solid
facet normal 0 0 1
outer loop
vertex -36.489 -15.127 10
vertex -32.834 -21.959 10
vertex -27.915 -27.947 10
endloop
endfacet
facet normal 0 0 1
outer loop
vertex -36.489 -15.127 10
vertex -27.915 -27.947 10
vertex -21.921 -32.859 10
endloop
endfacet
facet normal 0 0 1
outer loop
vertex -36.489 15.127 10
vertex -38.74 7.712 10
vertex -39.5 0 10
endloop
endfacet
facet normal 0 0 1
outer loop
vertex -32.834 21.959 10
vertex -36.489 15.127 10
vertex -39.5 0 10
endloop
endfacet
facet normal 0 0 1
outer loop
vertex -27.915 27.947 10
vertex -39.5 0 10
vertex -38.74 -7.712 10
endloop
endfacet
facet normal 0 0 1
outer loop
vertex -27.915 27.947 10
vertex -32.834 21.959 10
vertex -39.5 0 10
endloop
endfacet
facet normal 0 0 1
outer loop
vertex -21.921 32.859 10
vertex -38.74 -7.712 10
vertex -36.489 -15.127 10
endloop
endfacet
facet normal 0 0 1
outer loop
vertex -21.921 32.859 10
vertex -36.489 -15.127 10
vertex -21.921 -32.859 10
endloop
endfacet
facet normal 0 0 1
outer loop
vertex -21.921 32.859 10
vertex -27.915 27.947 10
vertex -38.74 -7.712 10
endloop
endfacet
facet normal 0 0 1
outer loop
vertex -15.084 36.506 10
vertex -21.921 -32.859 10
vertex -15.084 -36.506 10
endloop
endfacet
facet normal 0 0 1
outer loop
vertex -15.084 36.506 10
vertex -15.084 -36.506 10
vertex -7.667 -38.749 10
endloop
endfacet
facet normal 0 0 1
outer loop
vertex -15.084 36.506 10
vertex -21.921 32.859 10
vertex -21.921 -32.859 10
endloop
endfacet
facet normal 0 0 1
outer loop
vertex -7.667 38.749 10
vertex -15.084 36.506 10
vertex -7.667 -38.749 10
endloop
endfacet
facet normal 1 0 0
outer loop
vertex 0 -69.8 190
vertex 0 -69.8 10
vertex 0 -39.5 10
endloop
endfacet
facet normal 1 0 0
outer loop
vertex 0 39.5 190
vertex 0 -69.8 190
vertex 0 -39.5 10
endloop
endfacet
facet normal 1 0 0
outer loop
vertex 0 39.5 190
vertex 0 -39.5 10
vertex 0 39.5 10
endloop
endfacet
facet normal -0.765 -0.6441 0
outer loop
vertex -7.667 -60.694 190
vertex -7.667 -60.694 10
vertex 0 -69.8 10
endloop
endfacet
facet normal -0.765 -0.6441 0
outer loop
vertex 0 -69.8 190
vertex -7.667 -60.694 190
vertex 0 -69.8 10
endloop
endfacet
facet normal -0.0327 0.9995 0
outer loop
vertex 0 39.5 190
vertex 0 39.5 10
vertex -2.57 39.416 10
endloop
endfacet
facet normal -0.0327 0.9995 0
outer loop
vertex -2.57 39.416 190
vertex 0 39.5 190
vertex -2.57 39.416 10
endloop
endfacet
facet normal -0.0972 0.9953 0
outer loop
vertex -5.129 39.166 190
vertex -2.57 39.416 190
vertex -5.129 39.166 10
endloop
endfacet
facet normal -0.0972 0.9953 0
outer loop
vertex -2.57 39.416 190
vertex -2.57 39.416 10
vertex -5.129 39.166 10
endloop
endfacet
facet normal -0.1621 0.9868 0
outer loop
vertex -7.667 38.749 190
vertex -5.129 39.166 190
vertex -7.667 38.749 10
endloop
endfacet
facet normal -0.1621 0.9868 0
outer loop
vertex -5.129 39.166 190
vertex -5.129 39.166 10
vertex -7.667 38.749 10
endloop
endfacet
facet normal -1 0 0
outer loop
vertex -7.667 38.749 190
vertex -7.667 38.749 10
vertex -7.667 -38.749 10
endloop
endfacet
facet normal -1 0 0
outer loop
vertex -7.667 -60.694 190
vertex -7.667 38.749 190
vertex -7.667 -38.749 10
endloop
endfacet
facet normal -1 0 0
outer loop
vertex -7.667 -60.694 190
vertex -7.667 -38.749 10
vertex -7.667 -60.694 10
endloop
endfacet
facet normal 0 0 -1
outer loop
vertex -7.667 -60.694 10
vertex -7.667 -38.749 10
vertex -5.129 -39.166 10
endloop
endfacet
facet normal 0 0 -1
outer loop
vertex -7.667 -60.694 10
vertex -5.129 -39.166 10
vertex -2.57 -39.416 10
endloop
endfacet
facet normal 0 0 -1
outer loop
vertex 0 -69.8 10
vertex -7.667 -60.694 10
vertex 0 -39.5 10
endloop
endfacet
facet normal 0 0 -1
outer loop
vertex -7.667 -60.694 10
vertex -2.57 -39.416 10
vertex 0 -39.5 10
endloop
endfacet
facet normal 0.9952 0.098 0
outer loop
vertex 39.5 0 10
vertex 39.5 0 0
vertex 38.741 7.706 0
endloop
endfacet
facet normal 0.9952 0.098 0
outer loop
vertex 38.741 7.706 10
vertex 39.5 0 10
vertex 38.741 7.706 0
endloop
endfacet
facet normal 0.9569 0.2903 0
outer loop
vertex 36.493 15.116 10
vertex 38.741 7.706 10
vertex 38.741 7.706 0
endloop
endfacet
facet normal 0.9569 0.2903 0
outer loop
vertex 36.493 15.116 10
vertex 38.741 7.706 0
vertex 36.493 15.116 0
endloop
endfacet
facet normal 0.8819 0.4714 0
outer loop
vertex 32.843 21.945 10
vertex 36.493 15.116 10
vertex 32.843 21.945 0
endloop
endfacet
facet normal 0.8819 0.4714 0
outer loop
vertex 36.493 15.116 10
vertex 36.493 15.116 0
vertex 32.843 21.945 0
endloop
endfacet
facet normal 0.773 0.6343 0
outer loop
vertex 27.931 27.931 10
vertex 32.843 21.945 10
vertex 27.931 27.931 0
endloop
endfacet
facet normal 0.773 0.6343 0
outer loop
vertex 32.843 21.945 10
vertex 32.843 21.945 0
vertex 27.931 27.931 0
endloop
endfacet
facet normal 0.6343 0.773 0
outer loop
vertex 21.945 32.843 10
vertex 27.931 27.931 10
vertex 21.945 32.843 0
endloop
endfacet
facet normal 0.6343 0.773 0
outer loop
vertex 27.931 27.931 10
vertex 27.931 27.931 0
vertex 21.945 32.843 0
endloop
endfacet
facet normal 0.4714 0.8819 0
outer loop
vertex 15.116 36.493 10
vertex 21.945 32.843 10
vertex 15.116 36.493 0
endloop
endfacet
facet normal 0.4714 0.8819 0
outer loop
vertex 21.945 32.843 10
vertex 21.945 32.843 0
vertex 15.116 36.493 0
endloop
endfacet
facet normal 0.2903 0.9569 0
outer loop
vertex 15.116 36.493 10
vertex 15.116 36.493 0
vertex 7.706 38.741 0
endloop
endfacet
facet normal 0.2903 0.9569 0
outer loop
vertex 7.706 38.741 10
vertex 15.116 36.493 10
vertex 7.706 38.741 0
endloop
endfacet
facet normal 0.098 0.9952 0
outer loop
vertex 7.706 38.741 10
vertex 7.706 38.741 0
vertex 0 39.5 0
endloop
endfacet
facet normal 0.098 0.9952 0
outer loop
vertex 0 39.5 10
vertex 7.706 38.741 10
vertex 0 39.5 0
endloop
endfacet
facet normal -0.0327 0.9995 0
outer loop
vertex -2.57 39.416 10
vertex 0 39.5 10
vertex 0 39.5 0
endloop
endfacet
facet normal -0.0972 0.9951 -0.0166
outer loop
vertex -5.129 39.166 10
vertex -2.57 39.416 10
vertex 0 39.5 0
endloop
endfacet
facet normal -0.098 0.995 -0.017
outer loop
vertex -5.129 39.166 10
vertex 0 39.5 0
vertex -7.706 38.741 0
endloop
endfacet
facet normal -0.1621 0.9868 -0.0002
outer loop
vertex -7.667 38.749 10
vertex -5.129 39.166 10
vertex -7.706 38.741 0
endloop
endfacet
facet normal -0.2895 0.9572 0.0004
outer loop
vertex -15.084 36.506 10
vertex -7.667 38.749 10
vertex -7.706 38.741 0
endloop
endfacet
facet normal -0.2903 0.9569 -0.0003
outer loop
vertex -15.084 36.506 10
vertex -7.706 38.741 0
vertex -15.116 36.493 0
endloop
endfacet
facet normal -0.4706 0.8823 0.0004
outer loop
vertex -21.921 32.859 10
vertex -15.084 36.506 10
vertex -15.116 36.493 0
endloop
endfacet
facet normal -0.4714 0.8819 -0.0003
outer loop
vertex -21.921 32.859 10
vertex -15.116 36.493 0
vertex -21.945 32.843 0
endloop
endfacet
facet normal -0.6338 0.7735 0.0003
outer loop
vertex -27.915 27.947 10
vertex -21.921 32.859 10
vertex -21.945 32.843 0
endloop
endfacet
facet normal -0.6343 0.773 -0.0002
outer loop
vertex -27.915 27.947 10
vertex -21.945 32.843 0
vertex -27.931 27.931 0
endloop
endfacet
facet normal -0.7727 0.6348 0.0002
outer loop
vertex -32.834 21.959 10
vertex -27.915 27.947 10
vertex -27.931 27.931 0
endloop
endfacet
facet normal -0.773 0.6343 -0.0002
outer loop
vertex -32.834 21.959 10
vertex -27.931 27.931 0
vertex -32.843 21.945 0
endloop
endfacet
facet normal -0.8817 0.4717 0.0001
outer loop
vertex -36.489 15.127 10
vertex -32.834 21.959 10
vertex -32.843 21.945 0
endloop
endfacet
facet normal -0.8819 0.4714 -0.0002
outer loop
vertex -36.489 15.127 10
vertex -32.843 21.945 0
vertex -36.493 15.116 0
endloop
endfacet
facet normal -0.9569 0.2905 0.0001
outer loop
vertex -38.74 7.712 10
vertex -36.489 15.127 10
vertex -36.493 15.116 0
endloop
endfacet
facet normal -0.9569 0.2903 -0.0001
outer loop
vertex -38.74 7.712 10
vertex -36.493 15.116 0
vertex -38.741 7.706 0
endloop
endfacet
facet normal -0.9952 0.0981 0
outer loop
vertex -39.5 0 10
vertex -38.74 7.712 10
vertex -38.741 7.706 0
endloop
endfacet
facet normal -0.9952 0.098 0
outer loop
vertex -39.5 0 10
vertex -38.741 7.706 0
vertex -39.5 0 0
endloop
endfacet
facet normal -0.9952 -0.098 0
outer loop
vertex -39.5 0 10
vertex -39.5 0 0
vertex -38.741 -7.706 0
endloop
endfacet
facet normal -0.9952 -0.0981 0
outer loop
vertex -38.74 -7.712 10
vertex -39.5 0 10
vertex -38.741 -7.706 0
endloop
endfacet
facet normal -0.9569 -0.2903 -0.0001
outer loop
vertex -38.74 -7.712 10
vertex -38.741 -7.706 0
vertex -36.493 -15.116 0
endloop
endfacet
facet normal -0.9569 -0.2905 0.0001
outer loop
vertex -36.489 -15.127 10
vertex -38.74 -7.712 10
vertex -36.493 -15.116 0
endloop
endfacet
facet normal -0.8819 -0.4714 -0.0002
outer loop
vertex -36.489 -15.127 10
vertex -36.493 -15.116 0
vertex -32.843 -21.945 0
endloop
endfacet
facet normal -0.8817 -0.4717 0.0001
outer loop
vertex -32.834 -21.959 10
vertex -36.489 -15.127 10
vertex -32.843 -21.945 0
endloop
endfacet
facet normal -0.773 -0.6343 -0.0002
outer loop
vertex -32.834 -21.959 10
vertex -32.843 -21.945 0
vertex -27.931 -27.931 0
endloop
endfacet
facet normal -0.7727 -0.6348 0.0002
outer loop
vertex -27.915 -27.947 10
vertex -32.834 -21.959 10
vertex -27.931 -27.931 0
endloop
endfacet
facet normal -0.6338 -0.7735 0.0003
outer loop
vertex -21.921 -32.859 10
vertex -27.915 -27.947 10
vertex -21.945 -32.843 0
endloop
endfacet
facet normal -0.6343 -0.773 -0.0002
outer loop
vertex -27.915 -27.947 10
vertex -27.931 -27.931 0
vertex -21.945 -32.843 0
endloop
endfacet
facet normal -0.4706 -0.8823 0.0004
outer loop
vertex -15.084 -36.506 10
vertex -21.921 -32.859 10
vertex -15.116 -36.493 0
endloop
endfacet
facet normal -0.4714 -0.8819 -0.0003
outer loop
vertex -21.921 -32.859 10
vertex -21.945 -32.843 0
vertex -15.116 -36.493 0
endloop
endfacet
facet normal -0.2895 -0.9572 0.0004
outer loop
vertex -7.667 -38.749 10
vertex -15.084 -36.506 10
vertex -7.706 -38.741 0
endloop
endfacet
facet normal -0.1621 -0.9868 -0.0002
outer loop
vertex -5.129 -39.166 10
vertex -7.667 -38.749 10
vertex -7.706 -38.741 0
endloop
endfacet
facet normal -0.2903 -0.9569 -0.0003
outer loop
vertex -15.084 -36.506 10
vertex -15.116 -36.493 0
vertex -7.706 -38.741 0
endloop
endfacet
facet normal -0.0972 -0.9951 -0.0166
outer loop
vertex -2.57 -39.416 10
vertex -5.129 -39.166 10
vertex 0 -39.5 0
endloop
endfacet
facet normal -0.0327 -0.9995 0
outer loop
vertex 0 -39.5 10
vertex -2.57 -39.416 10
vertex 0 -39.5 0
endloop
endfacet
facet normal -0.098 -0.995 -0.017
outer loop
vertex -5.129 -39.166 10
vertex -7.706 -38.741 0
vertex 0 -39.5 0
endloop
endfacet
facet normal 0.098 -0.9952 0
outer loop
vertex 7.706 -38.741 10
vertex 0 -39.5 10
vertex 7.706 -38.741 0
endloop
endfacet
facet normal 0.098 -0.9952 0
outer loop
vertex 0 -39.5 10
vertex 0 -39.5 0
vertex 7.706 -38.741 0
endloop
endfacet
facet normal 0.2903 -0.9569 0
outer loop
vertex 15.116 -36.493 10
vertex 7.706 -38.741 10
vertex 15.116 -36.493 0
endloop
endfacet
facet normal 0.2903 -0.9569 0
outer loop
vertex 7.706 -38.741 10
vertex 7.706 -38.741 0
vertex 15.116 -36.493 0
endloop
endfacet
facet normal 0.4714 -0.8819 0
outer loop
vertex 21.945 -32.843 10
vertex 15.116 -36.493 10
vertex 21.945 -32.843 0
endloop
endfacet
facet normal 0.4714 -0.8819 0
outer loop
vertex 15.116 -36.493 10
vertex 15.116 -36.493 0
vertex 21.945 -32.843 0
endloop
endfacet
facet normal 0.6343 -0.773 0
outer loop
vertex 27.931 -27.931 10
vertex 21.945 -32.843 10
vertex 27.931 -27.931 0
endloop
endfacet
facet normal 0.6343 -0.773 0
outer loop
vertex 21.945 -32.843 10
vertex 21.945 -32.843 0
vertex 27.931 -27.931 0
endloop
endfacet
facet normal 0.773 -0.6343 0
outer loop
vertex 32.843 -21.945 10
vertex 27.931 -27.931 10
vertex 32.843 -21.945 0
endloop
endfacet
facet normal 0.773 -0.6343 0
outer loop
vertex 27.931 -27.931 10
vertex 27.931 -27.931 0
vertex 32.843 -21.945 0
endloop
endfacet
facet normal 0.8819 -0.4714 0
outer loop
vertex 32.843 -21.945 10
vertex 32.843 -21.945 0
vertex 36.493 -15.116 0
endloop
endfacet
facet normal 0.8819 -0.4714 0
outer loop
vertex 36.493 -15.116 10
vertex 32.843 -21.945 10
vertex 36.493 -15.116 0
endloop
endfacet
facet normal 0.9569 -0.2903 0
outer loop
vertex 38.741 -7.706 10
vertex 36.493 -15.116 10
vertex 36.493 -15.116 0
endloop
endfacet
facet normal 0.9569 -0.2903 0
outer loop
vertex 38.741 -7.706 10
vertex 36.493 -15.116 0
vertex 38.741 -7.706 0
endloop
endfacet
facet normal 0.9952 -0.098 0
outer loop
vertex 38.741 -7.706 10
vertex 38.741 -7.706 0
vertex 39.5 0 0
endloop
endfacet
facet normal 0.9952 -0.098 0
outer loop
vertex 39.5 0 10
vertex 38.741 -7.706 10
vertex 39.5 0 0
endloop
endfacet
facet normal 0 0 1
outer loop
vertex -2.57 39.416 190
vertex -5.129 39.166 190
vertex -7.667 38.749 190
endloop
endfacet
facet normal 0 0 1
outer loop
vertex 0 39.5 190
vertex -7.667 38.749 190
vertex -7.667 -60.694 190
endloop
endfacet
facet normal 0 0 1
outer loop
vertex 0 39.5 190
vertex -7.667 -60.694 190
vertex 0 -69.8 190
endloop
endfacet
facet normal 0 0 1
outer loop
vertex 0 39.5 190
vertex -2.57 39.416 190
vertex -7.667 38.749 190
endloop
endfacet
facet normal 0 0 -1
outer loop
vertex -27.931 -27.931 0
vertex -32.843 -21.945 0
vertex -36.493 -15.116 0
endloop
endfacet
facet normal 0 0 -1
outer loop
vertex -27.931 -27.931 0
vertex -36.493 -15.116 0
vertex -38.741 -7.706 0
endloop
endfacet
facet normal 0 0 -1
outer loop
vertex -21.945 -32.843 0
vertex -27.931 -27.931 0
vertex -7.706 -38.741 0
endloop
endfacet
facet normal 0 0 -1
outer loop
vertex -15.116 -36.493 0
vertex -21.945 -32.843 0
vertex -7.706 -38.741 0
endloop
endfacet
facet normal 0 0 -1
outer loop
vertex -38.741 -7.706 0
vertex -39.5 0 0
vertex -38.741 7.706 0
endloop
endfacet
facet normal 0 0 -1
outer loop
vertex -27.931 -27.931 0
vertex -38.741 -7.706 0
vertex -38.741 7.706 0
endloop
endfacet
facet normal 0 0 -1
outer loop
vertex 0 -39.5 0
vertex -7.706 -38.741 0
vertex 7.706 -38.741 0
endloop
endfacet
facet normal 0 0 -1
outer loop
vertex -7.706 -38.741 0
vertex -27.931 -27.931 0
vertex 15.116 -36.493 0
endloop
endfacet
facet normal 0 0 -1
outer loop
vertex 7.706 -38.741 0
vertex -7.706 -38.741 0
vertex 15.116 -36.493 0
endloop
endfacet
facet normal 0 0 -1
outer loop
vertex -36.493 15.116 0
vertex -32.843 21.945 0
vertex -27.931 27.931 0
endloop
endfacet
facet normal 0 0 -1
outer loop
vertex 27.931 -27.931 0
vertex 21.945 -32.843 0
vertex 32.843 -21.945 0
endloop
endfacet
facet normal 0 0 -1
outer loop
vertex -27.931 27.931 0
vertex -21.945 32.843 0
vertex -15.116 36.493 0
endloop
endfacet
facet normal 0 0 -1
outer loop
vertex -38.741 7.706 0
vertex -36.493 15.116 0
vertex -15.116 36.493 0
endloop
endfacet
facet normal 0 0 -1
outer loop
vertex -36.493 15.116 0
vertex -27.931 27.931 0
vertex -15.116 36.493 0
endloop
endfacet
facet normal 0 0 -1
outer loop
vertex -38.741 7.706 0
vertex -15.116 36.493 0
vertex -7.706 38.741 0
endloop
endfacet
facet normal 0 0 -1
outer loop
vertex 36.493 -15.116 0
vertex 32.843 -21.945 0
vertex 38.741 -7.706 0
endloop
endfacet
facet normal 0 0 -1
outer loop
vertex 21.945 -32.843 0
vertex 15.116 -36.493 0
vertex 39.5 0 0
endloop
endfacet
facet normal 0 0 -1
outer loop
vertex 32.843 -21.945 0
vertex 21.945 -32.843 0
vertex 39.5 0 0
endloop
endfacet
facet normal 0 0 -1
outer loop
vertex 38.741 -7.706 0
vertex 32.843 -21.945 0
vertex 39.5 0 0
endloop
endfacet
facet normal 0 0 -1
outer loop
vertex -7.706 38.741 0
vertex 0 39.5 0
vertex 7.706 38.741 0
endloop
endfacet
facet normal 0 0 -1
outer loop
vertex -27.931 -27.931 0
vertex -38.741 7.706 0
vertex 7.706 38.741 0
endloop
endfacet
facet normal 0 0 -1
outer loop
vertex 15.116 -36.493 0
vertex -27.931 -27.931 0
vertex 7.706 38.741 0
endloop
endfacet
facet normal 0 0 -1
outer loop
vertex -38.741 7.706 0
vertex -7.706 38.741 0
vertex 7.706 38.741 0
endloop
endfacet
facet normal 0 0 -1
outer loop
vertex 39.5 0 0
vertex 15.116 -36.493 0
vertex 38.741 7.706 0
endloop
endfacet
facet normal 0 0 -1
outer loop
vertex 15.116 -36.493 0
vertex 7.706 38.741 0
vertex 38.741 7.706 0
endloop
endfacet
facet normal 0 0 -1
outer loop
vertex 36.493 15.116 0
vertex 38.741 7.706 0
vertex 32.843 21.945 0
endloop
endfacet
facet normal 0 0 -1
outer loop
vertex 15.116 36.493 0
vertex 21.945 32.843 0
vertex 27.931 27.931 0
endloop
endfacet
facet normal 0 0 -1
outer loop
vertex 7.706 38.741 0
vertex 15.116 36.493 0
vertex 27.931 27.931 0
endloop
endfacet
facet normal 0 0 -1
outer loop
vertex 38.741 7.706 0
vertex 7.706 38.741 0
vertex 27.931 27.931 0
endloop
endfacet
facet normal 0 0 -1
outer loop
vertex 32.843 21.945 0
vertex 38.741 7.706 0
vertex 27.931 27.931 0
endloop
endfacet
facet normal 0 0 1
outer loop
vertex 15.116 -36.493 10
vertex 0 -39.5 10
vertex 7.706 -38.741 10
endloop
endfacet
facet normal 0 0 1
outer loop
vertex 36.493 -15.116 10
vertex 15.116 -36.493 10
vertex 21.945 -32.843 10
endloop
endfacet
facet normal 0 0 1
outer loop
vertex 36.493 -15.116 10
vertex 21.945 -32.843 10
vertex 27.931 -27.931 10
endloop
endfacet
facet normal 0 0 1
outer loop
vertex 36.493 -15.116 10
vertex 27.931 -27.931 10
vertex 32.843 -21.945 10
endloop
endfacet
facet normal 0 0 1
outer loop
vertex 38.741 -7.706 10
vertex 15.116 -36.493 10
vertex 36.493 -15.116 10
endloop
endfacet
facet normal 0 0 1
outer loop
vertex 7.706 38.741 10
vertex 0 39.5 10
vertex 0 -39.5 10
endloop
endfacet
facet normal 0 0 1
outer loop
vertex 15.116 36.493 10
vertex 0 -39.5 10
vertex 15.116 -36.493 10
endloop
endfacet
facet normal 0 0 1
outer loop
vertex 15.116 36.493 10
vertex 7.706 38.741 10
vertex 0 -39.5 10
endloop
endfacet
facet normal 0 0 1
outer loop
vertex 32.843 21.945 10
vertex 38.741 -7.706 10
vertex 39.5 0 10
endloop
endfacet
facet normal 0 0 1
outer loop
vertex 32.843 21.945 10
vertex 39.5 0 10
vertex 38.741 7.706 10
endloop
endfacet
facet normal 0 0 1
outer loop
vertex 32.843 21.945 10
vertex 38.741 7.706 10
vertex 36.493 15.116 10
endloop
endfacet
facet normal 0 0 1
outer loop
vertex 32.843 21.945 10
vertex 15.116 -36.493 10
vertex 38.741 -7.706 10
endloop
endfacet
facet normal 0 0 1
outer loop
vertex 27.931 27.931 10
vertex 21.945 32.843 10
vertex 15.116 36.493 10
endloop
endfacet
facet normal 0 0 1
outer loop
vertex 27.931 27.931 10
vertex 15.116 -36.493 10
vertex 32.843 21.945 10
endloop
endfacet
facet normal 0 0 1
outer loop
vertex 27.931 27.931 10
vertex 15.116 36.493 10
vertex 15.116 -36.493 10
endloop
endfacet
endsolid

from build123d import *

# Parameters (mm, degrees)
SKETCH_1_R      = 39.499995791
EXTRUDE_1_DEPTH = 10
EXTRUDE_2_DEPTH = 180


with BuildPart() as part:
    # 草图1 → 凸台-拉伸1 (new body)
    with BuildSketch(Plane.XY):
        Circle(SKETCH_1_R)
    extrude(amount=EXTRUDE_1_DEPTH)

    # 草图2 → 凸台-拉伸2 (add)
    with BuildSketch(Plane.XY.offset(10)):
        with BuildLine():
            Line((0, -69.800050309), (0, 39.499995791))
            ThreePointArc((0, 39.499995791), (-3.851829787, 39.3117422), (-7.666944594, 38.748775827))
            Line((-7.666944594, 38.748775827), (-7.666944594, -60.694122376))
            Line((-7.666944594, -60.694122376), (0, -69.800050309))
        make_face()
    extrude(amount=EXTRUDE_2_DEPTH)


solid = part.part
